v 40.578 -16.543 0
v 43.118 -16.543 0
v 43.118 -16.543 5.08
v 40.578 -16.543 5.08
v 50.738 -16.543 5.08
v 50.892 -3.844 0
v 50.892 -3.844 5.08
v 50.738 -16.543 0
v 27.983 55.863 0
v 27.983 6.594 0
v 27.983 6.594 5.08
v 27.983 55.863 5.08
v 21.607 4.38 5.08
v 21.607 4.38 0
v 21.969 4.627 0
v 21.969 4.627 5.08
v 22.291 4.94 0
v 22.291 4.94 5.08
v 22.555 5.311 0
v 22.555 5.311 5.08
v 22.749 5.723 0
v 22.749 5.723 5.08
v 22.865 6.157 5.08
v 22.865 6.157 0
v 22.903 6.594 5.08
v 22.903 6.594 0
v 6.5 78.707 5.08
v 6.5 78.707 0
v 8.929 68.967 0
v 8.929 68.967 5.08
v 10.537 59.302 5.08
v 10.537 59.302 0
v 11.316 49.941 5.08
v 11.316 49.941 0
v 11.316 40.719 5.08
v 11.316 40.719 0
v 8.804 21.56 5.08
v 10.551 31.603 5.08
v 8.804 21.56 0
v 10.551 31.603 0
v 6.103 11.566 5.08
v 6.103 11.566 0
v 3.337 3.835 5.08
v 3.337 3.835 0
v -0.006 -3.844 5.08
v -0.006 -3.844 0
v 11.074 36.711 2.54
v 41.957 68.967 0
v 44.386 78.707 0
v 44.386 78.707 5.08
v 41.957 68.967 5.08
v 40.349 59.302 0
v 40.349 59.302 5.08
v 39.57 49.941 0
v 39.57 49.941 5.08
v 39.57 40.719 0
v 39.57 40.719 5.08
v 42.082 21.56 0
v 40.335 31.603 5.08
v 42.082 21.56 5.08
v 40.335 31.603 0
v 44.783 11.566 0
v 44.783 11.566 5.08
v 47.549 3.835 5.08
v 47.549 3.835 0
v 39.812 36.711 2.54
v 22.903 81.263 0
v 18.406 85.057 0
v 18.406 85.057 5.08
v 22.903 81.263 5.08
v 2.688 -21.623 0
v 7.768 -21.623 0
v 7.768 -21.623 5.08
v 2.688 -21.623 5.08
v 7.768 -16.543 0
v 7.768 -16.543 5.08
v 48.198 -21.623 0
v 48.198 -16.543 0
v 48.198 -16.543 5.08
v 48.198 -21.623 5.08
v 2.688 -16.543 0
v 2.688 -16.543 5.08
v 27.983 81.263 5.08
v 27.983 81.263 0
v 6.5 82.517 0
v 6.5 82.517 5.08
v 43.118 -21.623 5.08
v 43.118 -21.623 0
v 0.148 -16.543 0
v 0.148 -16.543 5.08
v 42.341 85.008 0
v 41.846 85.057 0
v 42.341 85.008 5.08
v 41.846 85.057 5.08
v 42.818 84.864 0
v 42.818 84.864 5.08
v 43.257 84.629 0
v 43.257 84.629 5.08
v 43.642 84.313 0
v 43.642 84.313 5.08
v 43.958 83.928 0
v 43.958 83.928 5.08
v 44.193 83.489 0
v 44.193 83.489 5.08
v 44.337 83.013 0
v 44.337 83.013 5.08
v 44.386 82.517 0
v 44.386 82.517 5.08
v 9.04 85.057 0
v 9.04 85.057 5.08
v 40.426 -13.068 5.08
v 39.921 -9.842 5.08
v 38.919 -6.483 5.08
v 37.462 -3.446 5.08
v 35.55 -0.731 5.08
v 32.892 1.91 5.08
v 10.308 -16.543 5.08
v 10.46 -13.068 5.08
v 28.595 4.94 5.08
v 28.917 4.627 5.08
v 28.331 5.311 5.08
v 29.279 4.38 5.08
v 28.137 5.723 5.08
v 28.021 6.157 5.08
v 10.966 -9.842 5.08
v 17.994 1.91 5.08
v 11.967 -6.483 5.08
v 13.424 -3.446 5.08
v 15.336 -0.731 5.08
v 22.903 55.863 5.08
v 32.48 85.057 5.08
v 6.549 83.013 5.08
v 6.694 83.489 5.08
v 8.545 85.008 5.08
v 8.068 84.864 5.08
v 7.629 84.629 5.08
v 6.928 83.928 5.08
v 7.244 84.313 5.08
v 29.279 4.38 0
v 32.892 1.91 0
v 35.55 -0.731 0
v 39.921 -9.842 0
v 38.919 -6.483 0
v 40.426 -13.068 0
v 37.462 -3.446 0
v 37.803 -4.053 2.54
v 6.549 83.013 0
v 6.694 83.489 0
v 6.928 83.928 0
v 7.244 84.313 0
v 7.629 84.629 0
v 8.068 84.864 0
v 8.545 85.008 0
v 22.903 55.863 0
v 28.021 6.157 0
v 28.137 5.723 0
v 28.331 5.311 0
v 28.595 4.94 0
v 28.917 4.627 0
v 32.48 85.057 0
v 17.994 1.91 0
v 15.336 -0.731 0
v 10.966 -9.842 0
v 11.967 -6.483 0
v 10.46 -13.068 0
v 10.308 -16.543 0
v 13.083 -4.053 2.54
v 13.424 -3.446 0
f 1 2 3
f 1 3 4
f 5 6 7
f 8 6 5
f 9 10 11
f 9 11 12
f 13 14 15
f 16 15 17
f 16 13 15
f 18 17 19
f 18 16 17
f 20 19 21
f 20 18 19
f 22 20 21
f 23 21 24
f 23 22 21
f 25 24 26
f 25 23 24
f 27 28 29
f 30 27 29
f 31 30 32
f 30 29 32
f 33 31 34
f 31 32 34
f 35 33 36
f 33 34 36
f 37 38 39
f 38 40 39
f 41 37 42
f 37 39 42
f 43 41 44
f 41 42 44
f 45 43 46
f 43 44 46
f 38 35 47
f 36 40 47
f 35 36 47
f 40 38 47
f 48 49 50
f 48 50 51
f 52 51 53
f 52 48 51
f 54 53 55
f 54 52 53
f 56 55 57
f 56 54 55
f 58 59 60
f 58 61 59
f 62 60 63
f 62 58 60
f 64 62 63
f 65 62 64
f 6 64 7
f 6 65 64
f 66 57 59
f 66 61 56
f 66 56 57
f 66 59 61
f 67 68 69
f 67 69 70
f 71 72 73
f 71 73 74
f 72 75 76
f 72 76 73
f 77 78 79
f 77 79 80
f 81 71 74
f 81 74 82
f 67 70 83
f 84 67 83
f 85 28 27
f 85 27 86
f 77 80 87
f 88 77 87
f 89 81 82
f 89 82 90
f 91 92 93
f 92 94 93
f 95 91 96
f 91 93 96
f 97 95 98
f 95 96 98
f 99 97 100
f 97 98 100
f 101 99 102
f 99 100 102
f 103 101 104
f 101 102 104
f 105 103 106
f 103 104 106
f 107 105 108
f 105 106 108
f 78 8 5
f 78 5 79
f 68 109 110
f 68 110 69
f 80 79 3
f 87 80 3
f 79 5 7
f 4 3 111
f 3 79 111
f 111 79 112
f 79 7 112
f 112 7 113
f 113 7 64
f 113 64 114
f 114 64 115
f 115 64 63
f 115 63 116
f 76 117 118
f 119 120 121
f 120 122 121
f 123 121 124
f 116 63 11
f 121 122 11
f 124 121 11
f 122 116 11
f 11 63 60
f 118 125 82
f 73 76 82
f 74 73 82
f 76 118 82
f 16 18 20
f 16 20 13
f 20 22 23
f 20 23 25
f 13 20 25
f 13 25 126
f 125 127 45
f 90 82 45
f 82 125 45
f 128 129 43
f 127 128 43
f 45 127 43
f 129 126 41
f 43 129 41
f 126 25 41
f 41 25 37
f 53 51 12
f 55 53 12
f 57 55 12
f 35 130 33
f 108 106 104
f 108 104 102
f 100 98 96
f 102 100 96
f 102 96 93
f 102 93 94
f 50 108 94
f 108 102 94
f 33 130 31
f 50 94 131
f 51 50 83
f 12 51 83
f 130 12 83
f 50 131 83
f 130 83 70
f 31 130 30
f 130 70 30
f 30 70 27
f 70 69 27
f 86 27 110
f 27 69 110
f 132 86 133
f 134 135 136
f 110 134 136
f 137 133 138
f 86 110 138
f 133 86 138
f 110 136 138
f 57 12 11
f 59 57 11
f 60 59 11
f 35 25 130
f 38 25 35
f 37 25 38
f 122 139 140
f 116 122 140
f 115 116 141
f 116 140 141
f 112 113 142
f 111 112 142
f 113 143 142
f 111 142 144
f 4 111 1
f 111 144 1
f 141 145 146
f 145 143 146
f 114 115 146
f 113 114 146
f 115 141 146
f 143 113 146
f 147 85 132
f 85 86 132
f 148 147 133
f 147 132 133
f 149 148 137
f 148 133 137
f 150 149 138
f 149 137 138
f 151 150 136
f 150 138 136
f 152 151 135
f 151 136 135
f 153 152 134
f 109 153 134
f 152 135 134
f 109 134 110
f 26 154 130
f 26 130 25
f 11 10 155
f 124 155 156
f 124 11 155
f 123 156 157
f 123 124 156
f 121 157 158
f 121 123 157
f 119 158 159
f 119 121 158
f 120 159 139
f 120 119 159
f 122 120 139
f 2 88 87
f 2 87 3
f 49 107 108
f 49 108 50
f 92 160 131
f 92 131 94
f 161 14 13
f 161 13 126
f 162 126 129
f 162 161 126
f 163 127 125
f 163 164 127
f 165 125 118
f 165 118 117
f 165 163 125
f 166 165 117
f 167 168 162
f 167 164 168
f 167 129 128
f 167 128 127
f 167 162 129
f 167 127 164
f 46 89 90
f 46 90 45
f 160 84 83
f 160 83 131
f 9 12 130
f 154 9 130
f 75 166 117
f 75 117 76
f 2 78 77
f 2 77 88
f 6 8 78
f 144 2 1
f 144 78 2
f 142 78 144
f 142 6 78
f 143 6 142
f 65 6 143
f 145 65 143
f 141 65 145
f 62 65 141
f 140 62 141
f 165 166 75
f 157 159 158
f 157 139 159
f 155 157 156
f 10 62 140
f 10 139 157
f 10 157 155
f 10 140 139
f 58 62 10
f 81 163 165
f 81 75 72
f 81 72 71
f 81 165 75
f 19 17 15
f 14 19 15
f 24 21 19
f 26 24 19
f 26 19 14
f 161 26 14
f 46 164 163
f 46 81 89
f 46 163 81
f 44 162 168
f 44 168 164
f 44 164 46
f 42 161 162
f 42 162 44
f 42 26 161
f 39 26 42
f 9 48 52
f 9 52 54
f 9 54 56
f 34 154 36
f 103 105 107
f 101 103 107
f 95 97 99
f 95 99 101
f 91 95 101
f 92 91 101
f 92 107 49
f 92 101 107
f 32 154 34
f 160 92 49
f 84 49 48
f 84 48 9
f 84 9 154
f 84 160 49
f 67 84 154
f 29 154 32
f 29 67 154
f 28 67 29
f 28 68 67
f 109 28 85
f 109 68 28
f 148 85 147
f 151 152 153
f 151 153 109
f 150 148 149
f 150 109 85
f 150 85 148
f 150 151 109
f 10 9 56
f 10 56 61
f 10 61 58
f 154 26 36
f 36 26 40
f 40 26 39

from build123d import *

# Parameters (mm, degrees)
BOSS_EXTRUDE2_DEPTH = 5.08
FILLET3_R           = 2.54
FILLET4_R           = 2.54


with BuildPart() as part:
    # Sketch3 → Boss-Extrude2 (new body)
    with BuildSketch(Plane.XY):
        with BuildLine():
            Line((0.14834484, -16.543006694), (-0.005888561, -3.843943262))
            add(Edge.make_bspline(
                [(6.500180425, 78.706993306), (18.901808207, 35.989935529), (-0.005888561, -3.843943262)],
                knots=[0, 0, 0, 1, 1, 1], degree=2))
            Line((6.500180425, 78.706993306), (6.500180425, 85.056993306))
            Line((6.500180425, 85.056993306), (18.406430425, 85.056993306))
            Line((18.406430425, 85.056993306), (22.903074533, 81.262968128))
            Line((22.903074533, 81.262968128), (27.983074533, 81.262968128))
            Line((27.983074533, 81.262968128), (32.479718641, 85.056993306))
            Line((32.479718641, 85.056993306), (44.385968641, 85.056993306))
            Line((44.385968641, 85.056993306), (44.385968641, 78.706993306))
            add(Edge.make_bspline(
                [(44.385968641, 78.706993306), (31.984340858, 35.989935529), (50.892037627, -3.843943262)],
                knots=[0, 0, 0, 1, 1, 1], degree=2))
            Line((50.892037627, -3.843943262), (50.737804225, -16.543006694))
            Line((50.737804225, -16.543006694), (48.197804225, -16.543006694))
            Line((48.197804225, -16.543006694), (48.197804225, -21.623006694))
            Line((48.197804225, -21.623006694), (43.117804225, -21.623006694))
            Line((43.117804225, -21.623006694), (43.117804225, -16.543006694))
            Line((43.117804225, -16.543006694), (40.577804225, -16.543006694))
            add(Edge.make_bspline(
                [(27.983074533, 5.062968128), (40.683819064, -1.22119794), (40.577804225, -16.543006694)],
                knots=[0, 0, 0, 1, 1, 1], degree=2))
            Line((27.983074533, 5.062968128), (27.983074533, 55.862968128))
            Line((27.983074533, 55.862968128), (22.903074533, 55.862968128))
            Line((22.903074533, 55.862968128), (22.903074533, 5.062968128))
            add(Edge.make_bspline(
                [(22.903074533, 5.062968128), (10.202330001, -1.22119794), (10.30834484, -16.543006694)],
                knots=[0, 0, 0, 1, 1, 1], degree=2))
            Line((10.30834484, -16.543006694), (7.76834484, -16.543006694))
            Line((7.76834484, -16.543006694), (7.76834484, -21.623006694))
            Line((7.76834484, -21.623006694), (2.68834484, -21.623006694))
            Line((2.68834484, -21.623006694), (2.68834484, -16.543006694))
            Line((2.68834484, -16.543006694), (0.14834484, -16.543006694))
        make_face()
    extrude(amount=BOSS_EXTRUDE2_DEPTH)

    # Fillet3
    fillet3_edges = [part.edges().sort_by_distance(p)[0] for p in [
        (6.500180425, 85.056993306, 2.54),
        (44.385968641, 85.056993306, 2.54),
    ]]
    fillet(fillet3_edges, radius=FILLET3_R)

    # Fillet4
    fillet4_edges = [part.edges().sort_by_distance(p)[0] for p in [
        (27.983074533, 5.062968128, 2.54),
        (22.903074533, 5.062968128, 2.54),
    ]]
    fillet(fillet4_edges, radius=FILLET4_R)


solid = part.part
